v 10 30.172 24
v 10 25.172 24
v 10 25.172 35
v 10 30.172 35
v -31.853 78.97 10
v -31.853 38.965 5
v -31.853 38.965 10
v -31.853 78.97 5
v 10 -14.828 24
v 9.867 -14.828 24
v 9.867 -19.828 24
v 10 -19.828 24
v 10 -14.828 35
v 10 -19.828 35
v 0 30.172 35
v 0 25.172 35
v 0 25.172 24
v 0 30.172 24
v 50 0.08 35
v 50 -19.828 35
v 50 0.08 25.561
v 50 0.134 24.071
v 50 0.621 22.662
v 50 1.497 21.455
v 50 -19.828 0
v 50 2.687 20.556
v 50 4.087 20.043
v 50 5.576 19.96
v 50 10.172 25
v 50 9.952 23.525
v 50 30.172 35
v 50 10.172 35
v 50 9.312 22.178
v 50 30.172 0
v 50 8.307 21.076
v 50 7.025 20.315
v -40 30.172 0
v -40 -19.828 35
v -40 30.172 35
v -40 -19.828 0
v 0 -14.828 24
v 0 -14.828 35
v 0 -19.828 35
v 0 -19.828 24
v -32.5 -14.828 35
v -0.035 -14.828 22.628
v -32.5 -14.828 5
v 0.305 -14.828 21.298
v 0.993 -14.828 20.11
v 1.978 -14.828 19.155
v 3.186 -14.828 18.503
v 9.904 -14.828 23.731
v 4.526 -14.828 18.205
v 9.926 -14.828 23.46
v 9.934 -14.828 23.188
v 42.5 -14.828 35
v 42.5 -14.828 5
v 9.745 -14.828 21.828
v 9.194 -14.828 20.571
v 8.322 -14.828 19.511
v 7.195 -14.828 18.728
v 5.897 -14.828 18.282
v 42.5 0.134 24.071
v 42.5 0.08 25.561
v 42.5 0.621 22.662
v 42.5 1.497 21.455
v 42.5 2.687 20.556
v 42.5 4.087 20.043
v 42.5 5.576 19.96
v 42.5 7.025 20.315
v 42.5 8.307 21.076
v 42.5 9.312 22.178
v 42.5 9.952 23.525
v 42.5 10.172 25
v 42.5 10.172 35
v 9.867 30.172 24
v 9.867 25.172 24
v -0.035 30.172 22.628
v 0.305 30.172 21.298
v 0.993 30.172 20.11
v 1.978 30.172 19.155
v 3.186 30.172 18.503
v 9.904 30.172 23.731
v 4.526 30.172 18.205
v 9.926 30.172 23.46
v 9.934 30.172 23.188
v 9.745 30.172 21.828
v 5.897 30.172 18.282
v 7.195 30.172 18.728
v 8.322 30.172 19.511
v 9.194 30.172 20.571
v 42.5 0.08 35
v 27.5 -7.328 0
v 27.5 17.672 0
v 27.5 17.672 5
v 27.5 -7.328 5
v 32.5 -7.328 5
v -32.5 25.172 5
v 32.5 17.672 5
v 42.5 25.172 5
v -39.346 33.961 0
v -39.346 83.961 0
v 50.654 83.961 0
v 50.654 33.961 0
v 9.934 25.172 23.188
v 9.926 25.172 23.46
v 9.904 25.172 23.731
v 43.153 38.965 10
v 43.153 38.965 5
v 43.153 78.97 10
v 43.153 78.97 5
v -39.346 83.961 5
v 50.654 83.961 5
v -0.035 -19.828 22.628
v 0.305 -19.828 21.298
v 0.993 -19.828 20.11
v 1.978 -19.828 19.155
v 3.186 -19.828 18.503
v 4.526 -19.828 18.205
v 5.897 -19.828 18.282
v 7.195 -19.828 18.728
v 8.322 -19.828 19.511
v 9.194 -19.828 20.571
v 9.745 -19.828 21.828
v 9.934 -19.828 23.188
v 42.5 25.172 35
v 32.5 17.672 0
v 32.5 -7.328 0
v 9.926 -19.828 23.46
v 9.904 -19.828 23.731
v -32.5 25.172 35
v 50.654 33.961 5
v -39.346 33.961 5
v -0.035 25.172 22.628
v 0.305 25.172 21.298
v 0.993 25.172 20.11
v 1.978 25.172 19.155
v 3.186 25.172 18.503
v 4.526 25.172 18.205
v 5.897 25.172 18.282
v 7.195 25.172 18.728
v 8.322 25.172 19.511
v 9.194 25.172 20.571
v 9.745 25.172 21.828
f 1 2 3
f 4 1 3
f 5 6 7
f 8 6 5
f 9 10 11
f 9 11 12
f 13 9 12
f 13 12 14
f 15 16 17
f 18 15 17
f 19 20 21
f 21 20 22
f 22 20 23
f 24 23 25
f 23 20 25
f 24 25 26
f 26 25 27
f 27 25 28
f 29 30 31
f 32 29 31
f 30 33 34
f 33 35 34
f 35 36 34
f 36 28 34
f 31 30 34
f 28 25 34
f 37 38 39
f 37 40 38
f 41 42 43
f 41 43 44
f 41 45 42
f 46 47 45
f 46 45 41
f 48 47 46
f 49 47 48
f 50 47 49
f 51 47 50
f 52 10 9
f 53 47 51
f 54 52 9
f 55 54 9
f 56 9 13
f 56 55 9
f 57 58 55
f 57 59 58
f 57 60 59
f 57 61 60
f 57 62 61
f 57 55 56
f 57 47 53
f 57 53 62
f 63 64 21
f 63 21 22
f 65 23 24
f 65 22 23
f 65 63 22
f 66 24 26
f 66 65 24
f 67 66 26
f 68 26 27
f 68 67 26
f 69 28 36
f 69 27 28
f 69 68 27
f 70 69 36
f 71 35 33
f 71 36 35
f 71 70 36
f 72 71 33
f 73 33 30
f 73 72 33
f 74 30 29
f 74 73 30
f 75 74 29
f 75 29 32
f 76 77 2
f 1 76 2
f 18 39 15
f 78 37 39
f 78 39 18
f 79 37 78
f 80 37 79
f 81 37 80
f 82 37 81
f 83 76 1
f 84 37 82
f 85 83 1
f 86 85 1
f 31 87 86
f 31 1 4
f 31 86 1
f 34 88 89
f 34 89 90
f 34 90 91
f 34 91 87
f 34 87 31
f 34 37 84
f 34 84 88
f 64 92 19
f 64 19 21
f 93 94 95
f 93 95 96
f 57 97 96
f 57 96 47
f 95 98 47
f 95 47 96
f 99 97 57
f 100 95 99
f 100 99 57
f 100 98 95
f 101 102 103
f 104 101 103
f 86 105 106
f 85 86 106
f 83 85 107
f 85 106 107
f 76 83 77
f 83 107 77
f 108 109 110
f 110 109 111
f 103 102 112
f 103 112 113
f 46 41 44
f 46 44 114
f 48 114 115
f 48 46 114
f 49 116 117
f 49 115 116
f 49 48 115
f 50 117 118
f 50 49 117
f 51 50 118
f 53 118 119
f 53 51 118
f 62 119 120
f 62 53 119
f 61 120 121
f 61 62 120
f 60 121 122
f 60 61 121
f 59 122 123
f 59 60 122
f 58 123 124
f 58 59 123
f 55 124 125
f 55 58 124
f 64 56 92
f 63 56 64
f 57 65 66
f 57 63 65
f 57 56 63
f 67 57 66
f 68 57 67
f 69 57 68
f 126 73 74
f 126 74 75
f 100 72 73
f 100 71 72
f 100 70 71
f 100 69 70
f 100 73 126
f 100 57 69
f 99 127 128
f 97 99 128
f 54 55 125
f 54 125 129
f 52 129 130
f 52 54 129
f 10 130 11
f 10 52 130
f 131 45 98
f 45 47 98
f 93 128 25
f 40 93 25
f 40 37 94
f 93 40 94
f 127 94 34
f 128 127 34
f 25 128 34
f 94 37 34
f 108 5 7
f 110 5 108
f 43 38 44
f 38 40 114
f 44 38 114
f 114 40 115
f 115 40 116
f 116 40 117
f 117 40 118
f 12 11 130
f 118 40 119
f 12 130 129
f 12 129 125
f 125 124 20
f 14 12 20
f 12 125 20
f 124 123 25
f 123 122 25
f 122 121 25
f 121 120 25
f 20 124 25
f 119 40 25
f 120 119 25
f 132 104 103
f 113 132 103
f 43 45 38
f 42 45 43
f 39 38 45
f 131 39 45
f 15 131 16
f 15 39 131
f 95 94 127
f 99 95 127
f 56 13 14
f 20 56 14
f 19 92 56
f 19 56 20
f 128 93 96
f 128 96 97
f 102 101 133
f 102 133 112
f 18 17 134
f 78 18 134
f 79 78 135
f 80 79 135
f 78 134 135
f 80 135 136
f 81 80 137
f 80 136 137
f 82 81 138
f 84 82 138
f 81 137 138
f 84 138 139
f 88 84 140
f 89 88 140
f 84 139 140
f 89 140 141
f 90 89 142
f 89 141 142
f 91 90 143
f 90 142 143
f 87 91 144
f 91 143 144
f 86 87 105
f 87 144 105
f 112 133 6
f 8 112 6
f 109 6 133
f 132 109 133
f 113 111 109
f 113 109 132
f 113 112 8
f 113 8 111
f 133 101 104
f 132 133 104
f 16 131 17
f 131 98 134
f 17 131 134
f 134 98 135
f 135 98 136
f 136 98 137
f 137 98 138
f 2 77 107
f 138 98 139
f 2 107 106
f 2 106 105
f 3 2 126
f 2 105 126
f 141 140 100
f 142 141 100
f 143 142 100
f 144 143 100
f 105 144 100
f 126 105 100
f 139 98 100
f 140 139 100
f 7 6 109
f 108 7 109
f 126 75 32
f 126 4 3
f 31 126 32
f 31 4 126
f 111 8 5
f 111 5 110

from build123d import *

# Parameters (mm, degrees)
F0_W           = 90
F0_H           = 50
F1_DEPTH       = 30
F2_W           = 75
F2_H           = 40
F4_DEPTH       = 25
F5_W           = 5
F5_H           = 25
F6_DEPTH       = 20
F3_W           = 90
F3_H           = 50
F3_W_2         = 75
F3_H_2         = 40
F7_DEPTH       = 5
F8_W           = 90
F8_H           = 50
F9_DEPTH       = 5
F10_W          = 75.0062
F10_H          = 40.005
F11_DEPTH      = 10
F13_DEPTH      = 53.35581
F13_DEPTH_BACK = 52.639
F15_DEPTH      = 79.2615


with BuildPart() as f1:
    # F0 (on Top) → F1 (new body)
    with BuildSketch(Plane.XY):
        with Locations((4.9999981374, 5.1716030198)):
            Rectangle(F0_W, F0_H)
    extrude(amount=F1_DEPTH)

    # F2 (on face) → F4 (cut)
    with BuildSketch(Plane.XY.offset(30)):
        with Locations((4.9999981374, 5.1716030198)):
            Rectangle(F2_W, F2_H)
    extrude(amount=-F4_DEPTH, mode=Mode.SUBTRACT)

    # F5 (on face) → F6 (cut)
    with BuildSketch(Plane(origin=(0, 0, 0), x_dir=(1, 0, 0), z_dir=(0, 0, -1))):
        with Locations((29.9999981374, -5.1716030198)):
            Rectangle(F5_W, F5_H)
    extrude(amount=-F6_DEPTH, mode=Mode.SUBTRACT)

    # F3 (on face) → F7 (join)
    with BuildSketch(Plane.XY.offset(30)):
        with Locations((4.9999981374, 5.1716030198)):
            Rectangle(F3_W, F3_H)
        with Locations((4.9999981374, 5.1716030198)):
            Rectangle(F3_W_2, F3_H_2, mode=Mode.SUBTRACT)
    extrude(amount=F7_DEPTH)

    # F12 (on Front) → F13 (cut, two sides)
    with BuildSketch(Plane.XZ) as f13_sk:
        with BuildLine():
            Line((9.867221937, 24), (-1.8626e-06, 24))
            ThreePointArc((-1.8626e-06, 24), (4.5262155718, 18.2045448505), (9.9336100372, 23.1879201876))
            ThreePointArc((9.9336100372, 23.1879201876), (9.9169853742, 23.5953146529), (9.867221937, 24))
        make_face()
        with BuildLine():
            Line((-1.8626e-06, 54), (-1.8626e-06, 24))
            ThreePointArc((-1.8626e-06, 24), (4.9336100372, 28.1879201876), (9.867221937, 24))
            Line((9.867221937, 24), (9.9999981374, 24))
            Line((9.9999981374, 24), (9.9999981374, 54))
            Line((9.9999981374, 54), (-1.8626e-06, 54))
        make_face()
        with BuildLine():
            ThreePointArc((9.867221937, 24), (4.9336100372, 28.1879201876), (-1.8626e-06, 24))
            Line((-1.8626e-06, 24), (9.867221937, 24))
        make_face()
    extrude(amount=-F13_DEPTH, mode=Mode.SUBTRACT)
    extrude(f13_sk.sketch, amount=F13_DEPTH_BACK, mode=Mode.SUBTRACT)

    # F14 (on Right) → F15 (cut)
    with BuildSketch(Plane.YZ):
        with BuildLine():
            Line((0.0795685682, 25), (10.1716030198, 25))
            ThreePointArc((10.1716030198, 25), (5.3911491634, 30.0538213364), (0.0795685682, 25.5614989133))
            Line((0.0795685682, 25.5614989133), (0.0795685682, 25))
        make_face()
        with BuildLine():
            ThreePointArc((0.0795685682, 25.5614989133), (4.8287818426, 19.9461786636), (10.1716030198, 25))
            Line((10.1716030198, 25), (0.0795685682, 25))
            Line((0.0795685682, 25), (0.0795685682, 25.5614989133))
        make_face()
        with BuildLine():
            ThreePointArc((0.0795685682, 25.5614989133), (5.3911491634, 30.0538213364), (10.1716030198, 25))
            Line((10.1716030198, 25), (10.1716030198, 47.029498431))
            Line((10.1716030198, 47.029498431), (0.0795685682, 47.029498431))
            Line((0.0795685682, 47.029498431), (0.0795685682, 25.5614989133))
        make_face()
    extrude(amount=F15_DEPTH, mode=Mode.SUBTRACT)


with BuildPart() as f9:
    # F8 (on Top) → F9 (new body)
    with BuildSketch(Plane.XY):
        with Locations((5.6538152695, 58.9610800147)):
            Rectangle(F8_W, F8_H)
    extrude(amount=F9_DEPTH)

    # F10 (on Top) → F11 (join)
    with BuildSketch(Plane.XY):
        with Locations((5.6499152695, 58.9673800147)):
            Rectangle(F10_W, F10_H)
    extrude(amount=F11_DEPTH)


solid = Compound([f1.part, f9.part])
